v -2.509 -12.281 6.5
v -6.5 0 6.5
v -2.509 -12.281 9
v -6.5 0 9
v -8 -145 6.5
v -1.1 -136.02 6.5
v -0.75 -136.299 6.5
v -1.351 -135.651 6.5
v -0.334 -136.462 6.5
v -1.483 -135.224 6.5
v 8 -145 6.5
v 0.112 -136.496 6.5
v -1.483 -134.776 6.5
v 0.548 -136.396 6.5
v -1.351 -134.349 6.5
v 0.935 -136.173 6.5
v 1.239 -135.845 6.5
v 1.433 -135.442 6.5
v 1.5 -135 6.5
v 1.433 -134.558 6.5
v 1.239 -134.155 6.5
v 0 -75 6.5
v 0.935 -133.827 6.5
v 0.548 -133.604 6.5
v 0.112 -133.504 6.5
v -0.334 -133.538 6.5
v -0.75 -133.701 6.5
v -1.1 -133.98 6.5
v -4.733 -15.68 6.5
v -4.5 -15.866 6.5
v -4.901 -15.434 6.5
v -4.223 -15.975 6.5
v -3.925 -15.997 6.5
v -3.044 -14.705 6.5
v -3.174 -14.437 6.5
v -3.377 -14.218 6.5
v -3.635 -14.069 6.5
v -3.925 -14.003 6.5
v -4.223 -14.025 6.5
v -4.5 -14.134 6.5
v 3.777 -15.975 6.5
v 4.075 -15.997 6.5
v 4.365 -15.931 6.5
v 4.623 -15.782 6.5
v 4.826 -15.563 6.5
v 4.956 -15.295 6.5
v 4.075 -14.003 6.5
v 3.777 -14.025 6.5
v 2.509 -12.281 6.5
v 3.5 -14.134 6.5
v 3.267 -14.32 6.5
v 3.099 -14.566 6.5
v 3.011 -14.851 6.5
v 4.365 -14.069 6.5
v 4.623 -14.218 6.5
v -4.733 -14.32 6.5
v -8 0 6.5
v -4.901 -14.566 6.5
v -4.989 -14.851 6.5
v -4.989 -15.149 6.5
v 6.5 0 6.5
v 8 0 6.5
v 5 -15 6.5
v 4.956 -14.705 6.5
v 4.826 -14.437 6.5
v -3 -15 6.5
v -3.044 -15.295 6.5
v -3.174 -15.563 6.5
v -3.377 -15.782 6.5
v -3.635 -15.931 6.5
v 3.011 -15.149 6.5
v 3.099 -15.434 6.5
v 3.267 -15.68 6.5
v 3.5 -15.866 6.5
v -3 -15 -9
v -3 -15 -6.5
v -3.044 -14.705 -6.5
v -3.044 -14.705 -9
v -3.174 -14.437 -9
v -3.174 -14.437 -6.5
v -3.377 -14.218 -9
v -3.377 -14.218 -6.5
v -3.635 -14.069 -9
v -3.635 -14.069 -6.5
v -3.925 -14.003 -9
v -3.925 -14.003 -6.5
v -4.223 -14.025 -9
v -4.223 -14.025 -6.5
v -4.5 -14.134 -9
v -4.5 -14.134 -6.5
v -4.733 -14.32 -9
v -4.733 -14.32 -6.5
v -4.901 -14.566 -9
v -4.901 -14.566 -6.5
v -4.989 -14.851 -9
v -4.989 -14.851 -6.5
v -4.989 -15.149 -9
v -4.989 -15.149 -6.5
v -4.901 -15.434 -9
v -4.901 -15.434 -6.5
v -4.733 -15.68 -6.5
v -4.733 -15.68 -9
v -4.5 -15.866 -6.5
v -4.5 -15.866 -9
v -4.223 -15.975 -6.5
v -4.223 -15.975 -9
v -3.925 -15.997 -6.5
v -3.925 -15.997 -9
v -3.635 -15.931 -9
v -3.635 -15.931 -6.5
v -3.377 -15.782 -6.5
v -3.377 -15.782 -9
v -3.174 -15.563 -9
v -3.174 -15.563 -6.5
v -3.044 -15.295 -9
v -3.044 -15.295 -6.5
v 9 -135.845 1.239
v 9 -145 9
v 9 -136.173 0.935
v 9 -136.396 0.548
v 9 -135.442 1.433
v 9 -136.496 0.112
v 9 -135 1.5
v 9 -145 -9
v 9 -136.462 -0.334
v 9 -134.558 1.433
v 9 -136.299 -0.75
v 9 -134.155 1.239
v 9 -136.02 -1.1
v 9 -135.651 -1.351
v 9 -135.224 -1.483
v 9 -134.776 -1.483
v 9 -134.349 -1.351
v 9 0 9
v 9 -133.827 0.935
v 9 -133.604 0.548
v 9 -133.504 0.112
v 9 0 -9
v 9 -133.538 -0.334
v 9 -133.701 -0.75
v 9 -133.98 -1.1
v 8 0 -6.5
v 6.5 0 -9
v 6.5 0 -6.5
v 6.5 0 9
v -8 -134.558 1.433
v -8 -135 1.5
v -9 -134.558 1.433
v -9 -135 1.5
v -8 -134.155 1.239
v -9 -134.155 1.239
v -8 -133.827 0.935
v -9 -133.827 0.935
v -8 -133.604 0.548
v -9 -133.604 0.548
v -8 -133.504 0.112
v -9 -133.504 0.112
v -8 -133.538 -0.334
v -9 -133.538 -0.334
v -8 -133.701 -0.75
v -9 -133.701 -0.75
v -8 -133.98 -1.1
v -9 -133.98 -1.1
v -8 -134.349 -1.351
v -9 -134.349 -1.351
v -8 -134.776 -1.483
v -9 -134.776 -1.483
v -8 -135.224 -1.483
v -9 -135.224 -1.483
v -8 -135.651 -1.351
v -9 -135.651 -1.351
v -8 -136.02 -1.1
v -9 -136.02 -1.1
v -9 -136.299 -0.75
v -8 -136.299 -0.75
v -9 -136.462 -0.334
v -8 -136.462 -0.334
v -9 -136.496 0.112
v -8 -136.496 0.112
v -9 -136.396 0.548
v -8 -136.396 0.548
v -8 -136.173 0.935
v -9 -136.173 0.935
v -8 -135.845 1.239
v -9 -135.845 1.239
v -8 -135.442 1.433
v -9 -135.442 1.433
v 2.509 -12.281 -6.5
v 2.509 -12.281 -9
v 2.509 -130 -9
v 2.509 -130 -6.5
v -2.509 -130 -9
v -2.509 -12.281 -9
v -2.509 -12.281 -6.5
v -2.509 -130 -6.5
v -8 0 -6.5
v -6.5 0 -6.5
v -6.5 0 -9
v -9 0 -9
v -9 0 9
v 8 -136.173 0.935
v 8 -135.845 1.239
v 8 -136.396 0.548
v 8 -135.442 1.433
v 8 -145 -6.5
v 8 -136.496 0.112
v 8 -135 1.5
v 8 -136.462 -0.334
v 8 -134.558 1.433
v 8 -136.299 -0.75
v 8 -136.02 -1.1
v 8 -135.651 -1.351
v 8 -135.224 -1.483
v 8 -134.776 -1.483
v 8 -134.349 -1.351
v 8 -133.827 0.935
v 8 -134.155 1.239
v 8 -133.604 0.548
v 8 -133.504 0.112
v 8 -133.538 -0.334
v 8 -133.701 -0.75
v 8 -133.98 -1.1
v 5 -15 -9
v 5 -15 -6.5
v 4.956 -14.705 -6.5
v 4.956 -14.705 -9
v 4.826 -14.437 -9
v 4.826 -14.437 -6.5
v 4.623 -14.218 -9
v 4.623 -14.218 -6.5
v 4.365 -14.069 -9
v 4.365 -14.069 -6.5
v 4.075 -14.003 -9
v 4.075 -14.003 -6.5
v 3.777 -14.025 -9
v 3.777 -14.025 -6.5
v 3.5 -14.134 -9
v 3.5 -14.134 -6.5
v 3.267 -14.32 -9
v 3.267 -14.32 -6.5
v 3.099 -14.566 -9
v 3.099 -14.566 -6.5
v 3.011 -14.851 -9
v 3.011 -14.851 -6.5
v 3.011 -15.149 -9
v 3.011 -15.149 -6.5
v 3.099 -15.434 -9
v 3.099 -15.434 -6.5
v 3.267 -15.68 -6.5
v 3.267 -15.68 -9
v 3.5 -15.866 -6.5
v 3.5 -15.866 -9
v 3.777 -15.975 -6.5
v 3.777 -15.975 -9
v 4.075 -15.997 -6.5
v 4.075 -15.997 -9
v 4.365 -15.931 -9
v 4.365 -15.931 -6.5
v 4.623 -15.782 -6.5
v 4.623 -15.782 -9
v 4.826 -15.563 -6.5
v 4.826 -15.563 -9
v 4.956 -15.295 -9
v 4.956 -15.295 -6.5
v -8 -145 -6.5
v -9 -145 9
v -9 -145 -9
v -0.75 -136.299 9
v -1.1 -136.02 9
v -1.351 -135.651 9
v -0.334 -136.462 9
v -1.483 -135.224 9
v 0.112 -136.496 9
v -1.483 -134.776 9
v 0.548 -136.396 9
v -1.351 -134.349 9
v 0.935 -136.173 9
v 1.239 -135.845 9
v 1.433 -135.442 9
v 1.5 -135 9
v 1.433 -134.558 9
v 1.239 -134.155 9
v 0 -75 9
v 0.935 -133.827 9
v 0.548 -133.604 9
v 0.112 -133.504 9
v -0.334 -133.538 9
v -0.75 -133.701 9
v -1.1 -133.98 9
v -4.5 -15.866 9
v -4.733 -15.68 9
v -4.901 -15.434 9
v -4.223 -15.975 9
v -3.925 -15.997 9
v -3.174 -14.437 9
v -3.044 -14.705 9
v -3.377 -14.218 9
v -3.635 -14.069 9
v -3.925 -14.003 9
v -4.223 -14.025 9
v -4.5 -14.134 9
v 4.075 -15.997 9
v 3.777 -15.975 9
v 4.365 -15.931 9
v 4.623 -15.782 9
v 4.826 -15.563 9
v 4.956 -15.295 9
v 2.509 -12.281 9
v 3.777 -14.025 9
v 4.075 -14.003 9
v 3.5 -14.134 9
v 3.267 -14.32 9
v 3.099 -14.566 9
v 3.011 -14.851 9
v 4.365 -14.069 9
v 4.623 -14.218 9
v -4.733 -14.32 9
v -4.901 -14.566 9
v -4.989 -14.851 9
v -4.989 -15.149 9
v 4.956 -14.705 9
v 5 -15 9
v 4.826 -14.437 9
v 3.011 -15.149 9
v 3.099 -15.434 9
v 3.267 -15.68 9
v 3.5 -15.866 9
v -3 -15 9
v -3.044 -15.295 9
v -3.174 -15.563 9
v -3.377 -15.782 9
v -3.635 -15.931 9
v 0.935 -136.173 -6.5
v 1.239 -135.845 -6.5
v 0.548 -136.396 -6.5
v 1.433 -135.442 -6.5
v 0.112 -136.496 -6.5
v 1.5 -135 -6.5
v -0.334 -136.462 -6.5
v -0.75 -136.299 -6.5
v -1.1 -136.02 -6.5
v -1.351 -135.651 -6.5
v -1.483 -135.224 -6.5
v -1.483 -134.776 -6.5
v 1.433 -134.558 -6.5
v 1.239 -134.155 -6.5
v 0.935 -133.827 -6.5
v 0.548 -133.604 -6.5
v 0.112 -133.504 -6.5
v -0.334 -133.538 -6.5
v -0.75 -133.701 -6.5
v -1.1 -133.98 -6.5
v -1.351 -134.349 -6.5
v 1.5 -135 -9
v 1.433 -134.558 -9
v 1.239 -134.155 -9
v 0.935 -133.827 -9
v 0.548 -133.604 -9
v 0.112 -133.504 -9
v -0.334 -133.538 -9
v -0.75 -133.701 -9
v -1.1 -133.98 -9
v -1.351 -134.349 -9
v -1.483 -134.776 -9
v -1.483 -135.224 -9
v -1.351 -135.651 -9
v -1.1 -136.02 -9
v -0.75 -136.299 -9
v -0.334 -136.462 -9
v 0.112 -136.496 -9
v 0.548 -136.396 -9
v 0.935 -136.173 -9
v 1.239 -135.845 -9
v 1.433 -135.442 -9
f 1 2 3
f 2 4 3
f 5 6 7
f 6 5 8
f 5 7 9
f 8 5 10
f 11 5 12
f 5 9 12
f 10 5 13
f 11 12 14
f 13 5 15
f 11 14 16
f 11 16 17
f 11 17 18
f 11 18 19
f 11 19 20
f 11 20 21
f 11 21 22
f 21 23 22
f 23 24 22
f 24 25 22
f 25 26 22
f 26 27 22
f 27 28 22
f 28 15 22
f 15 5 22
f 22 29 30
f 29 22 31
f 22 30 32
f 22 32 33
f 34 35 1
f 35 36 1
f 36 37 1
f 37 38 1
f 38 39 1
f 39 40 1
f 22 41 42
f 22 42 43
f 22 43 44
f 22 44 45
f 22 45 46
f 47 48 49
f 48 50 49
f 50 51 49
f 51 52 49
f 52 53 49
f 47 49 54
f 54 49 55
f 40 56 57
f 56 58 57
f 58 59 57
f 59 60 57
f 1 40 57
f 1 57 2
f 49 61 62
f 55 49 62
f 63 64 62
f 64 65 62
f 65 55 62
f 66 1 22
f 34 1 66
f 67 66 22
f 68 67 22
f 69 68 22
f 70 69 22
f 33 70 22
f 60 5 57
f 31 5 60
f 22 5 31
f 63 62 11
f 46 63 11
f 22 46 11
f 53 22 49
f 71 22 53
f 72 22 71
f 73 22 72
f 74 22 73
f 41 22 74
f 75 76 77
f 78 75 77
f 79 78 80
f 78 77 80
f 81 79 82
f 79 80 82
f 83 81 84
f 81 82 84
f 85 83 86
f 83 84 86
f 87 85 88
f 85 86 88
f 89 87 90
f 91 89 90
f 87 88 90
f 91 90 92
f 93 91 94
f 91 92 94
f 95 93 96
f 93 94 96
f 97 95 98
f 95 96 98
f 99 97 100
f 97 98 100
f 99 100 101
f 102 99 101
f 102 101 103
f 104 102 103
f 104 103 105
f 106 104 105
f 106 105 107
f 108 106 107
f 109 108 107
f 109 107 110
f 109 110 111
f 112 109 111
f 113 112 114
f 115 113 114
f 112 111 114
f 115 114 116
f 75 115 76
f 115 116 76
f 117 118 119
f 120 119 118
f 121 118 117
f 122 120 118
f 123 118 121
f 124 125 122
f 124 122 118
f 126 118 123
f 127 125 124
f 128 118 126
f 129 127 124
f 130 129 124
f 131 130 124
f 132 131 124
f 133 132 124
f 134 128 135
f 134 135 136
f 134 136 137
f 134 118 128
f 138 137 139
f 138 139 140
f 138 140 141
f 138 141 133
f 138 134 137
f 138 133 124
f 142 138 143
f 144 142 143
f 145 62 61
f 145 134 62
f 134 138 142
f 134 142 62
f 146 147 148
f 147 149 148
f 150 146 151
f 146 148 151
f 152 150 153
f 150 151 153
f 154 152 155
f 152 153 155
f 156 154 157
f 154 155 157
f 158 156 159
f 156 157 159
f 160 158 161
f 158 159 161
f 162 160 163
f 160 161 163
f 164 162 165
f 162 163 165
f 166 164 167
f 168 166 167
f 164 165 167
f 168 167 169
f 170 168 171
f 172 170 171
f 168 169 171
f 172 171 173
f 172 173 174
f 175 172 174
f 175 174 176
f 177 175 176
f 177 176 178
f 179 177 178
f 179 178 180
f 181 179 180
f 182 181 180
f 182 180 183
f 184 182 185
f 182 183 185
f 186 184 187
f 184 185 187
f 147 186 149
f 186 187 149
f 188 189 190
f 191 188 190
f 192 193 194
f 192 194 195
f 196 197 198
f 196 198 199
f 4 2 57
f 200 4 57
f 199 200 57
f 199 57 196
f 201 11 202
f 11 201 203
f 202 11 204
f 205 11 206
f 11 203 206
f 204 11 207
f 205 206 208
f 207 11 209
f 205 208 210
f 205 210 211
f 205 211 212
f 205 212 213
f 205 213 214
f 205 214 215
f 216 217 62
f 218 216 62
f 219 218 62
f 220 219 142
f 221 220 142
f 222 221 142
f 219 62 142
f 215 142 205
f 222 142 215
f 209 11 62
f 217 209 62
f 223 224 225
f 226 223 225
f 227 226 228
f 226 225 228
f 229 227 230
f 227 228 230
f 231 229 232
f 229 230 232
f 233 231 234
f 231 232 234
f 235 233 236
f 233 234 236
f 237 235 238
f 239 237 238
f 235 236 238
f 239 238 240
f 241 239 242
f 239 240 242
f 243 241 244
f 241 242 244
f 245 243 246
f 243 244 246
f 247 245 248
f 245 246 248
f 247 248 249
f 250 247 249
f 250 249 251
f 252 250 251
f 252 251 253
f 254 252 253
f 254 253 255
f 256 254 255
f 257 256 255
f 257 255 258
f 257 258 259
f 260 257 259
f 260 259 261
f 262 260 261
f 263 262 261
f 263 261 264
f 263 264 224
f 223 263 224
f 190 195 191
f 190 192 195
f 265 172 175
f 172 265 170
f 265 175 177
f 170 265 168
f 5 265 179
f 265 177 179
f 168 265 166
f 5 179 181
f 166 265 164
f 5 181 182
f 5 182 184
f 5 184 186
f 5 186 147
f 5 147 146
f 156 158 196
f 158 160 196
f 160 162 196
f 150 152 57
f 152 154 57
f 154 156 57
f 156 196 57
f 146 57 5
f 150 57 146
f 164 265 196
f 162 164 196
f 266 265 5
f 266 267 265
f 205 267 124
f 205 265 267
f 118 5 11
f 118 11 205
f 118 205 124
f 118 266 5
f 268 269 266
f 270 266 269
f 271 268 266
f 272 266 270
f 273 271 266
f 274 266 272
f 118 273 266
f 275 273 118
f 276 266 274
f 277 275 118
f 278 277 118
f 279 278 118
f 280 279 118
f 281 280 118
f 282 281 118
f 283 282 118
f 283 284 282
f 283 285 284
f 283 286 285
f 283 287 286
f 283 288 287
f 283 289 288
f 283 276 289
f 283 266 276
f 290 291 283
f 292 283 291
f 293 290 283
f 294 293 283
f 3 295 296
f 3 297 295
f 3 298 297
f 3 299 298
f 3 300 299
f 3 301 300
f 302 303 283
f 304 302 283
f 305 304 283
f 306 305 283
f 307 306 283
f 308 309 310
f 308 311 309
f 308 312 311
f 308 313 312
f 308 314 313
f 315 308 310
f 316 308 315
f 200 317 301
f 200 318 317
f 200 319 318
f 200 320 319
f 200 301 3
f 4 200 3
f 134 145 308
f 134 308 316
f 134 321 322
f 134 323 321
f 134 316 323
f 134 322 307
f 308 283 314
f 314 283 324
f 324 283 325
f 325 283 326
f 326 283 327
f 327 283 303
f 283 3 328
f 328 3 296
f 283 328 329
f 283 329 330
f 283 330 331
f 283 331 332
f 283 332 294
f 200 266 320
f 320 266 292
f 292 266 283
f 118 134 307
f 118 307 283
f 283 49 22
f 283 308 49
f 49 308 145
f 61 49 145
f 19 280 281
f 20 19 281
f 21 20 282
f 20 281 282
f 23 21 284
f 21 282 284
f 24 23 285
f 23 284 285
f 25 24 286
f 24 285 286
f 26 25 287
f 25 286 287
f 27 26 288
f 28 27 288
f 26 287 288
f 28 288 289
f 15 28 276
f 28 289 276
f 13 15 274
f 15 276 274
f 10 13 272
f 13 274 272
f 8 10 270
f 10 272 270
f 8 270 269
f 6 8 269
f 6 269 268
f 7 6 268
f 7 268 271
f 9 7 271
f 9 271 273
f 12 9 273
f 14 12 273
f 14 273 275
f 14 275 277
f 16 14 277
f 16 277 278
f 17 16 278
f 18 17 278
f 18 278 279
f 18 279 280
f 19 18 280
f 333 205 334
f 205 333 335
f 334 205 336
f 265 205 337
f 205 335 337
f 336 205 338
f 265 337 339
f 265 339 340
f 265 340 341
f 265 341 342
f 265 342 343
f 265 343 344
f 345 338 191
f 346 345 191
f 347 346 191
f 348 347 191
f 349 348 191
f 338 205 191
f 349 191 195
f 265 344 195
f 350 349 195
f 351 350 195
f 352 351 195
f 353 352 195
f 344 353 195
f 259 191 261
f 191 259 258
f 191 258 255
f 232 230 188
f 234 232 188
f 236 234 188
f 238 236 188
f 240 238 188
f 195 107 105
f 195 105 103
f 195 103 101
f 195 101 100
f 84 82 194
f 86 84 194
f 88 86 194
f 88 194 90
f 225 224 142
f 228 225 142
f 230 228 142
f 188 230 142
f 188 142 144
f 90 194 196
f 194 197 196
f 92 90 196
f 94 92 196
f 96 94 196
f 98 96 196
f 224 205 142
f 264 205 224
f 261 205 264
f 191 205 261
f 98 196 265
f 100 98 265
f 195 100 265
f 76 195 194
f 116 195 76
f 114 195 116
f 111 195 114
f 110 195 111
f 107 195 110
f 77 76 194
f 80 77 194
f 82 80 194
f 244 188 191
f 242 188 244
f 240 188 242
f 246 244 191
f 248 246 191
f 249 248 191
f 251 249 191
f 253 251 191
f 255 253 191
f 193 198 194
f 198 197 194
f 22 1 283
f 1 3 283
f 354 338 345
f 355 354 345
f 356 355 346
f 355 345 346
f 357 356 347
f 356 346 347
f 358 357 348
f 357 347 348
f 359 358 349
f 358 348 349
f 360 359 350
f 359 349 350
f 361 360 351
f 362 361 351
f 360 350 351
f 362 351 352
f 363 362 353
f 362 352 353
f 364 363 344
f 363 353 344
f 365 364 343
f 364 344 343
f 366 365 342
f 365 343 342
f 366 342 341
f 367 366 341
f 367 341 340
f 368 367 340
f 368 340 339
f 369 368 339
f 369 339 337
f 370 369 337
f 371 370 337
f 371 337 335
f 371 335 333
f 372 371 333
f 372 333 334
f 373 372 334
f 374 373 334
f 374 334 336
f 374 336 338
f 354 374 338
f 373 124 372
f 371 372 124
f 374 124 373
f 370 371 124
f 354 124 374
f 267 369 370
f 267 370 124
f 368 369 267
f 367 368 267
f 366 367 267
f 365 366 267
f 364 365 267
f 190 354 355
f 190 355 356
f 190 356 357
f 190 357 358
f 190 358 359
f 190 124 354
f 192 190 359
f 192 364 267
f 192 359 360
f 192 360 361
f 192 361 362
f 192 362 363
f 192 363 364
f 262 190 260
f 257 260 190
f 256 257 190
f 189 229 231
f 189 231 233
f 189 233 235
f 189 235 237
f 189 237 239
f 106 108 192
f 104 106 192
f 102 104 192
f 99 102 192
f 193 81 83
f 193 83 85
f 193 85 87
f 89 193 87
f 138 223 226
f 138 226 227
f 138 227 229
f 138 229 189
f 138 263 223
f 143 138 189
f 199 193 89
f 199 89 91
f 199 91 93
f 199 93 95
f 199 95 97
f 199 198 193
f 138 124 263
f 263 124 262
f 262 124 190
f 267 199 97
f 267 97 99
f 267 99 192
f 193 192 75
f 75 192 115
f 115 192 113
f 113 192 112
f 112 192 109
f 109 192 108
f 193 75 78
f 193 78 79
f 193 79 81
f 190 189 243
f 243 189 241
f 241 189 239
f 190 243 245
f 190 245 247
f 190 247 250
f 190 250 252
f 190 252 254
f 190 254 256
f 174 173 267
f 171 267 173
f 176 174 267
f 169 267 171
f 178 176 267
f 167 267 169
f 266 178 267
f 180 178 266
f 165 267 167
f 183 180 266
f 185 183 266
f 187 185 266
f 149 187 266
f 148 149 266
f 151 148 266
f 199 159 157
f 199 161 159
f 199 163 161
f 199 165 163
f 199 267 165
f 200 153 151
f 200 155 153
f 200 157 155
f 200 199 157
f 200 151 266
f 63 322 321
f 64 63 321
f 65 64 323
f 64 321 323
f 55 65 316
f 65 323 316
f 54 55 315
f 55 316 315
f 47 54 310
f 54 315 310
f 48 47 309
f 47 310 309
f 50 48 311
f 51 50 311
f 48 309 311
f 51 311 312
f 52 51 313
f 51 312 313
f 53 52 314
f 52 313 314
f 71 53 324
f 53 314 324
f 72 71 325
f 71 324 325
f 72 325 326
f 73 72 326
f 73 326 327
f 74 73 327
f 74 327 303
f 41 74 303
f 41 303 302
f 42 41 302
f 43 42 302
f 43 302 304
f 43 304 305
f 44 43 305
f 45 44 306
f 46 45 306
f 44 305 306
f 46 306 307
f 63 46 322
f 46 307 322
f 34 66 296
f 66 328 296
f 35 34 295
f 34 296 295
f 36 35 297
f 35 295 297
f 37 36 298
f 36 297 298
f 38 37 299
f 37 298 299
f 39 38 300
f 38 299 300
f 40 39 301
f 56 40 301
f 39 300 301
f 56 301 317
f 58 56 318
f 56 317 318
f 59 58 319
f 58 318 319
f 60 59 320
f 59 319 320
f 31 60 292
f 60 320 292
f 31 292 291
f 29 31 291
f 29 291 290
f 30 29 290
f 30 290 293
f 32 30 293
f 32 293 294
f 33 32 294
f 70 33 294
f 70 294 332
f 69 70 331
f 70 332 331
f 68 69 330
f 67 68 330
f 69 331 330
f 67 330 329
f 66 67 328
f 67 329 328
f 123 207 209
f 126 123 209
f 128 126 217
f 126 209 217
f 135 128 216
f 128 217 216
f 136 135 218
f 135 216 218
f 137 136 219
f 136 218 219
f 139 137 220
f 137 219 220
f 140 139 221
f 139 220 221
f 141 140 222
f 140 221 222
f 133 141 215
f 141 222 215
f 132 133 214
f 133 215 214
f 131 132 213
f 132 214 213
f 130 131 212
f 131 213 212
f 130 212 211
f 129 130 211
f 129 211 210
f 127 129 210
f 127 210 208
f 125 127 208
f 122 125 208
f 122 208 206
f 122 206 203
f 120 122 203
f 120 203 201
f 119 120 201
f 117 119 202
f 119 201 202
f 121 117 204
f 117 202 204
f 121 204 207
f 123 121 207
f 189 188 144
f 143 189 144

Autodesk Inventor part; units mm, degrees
ref_plane "YZ Plane" through (0, 0, 0) normal (1, 0, 0) x (0, 1, 0)
ref_plane "XZ Plane" through (0, 0, 0) normal (0, 1, 0) x (-1, 0, 0)
ref_plane "XY Plane" through (0, 0, 0) normal (0, 0, 1) x (1, 0, 0)
sketch "スケッチ1" plane through (0, 0, 0) normal (0, 1, 0) x (-1, 0, 0)
  line L0 (9, 9) -> (-9, 9)
  line L1 (-9, 9) -> (-9, -9)
  line L2 (-9, -9) -> (9, -9)
  line L3 (9, -9) -> (9, 9)
  line L4 (9, 9) -> (-9, -9) construction
  line L5 (-9, 9) -> (9, -9) construction
  point P0 (0, 0)
  dimension "d0" = 18
  dimension "d1" = 18
extrude "押し出し1" add sketch "スケッチ1" against normal blind 150
sketch "スケッチ2" plane through (0, 0, 0) normal (0, 1, 0) x (1, 0, 0)
  line L0 (-8, -6.5) -> (8, -6.5)
  line L1 (8, -6.5) -> (8, 6.5)
  line L2 (8, 6.5) -> (-8, 6.5)
  line L3 (-8, 6.5) -> (-8, -6.5)
  line L4 (-8, -6.5) -> (8, 6.5) construction
  line L5 (8, -6.5) -> (-8, 6.5) construction
  point P0 (0, 0)
  dimension "d4" = 16
  dimension "d5" = 13
extrude "押し出し2" cut sketch "スケッチ2" against normal blind 150
sketch "スケッチ4" plane through (-9, -150, 9) normal (0, 0, 1) x (1, 0, 0)
  circle A0 centre (5, 135) radius 1
  circle A1 centre (13, 135) radius 1
  point P0 (9, 150)
  dimension "d11" = 2
  dimension "d12" = 2
extrude "押し出し4" cut sketch "スケッチ4" against normal blind 150
sketch "スケッチ5" plane through (-9, -150, 9) normal (0, 0, 1) x (1, 0, 0)
  circle A0 centre (9, 15) radius 1.5
  point P0 (9, 150)
  dimension "d15" = 3
extrude "押し出し5" cut sketch "スケッチ5" against normal blind 150
sketch "スケッチ6" plane through (-9, 0, -9) normal (-1, 0, 0) x (0, 0, 1)
  circle A0 centre (9, -135) radius 1.5
  point P0 (9, 0)
  dimension "d18" = 3
extrude "押し出し6" cut sketch "スケッチ6" against normal blind 150
thread "ねじ1" size "M3x0.5" class "6H" standard "ANSI Metric M Profile" full length
thread "ねじ2" size "M3x0.5" class "6H" standard "ANSI Metric M Profile" full length
sketch "スケッチ7" plane through (-9, 0, 9) normal (0, 0, 1) x (1, 0, 0)
  line L0 (9, 0) -> (9, -75)
  line L1 (9, 0) -> (6, 0)
  line L2 (0, 0) -> (18, 0) projected
  line L3 (6, 0) -> (9, -75)
  line L4 (9, 0) -> (12, 0)
  line L5 (12, 0) -> (9, -75)
  point P0 (12, 0)
  dimension "d25" = 75
  dimension "d26" = 3
  dimension "d27" = 3
extrude "押し出し7" cut sketch "スケッチ7" against normal blind 30
sketch "スケッチ8" plane through (-9, -150, 9) normal (0, 0, 1) x (1, 0, 0)
  line L0 (9, 150) -> (15.5, 150)
  line L1 (18, 150) -> (12, 150) projected
  line L2 (9, 150) -> (9, 130)
  line L3 (9, 130) -> (15.5, 150)
  line L4 (9, 150) -> (2.5, 150)
  line L5 (2.5, 150) -> (9, 130)
  dimension "d30" = 6.5
  dimension "d31" = 20
  dimension "d32" = 6.5
extrude "押し出し8" cut sketch "スケッチ8" against normal blind 30
sketch "スケッチ9" plane through (9, -150, -9) normal (0, 0, -1) x (-1, 0, 0)
  line L0 (9, 150) -> (9, 20)
  line L1 (11.5088, 137.7193) -> (9, 75) projected
  line L2 (11.5088, 137.7193) -> (11.5088, 20)
  line L3 (11.5088, 20) -> (9, 20)
  line L4 (2.5, 150) -> (6.4912, 137.7193) projected
  line L5 (6.4912, 137.7193) -> (6.4912, 20)
  line L6 (6.4912, 20) -> (9, 20)
  line L7 (6.4912, 137.7193) -> (11.5088, 137.7193)
  dimension "d35" = 130
extrude "押し出し9" cut sketch "スケッチ9" against normal blind 10
sketch "スケッチ10" plane through (0, -150, 0) normal (0, -1, 0) x (1, 0, 0)
  line L0 (-9, -9) -> (-9, 9) projected
  line L1 (9, 9) -> (-9, 9)
  line L2 (-9, 9) -> (-9, -9)
  line L3 (-9, -9) -> (9, -9)
  line L4 (9, -9) -> (9, 9)
  line L5 (9, 9) -> (-9, -9) construction
  line L6 (-9, 9) -> (9, -9) construction
  point P0 (0, 0)
extrude "押し出し10" cut sketch "スケッチ10" against normal blind 5
properties part number "square_bar" material "アルミニウム 6061"
